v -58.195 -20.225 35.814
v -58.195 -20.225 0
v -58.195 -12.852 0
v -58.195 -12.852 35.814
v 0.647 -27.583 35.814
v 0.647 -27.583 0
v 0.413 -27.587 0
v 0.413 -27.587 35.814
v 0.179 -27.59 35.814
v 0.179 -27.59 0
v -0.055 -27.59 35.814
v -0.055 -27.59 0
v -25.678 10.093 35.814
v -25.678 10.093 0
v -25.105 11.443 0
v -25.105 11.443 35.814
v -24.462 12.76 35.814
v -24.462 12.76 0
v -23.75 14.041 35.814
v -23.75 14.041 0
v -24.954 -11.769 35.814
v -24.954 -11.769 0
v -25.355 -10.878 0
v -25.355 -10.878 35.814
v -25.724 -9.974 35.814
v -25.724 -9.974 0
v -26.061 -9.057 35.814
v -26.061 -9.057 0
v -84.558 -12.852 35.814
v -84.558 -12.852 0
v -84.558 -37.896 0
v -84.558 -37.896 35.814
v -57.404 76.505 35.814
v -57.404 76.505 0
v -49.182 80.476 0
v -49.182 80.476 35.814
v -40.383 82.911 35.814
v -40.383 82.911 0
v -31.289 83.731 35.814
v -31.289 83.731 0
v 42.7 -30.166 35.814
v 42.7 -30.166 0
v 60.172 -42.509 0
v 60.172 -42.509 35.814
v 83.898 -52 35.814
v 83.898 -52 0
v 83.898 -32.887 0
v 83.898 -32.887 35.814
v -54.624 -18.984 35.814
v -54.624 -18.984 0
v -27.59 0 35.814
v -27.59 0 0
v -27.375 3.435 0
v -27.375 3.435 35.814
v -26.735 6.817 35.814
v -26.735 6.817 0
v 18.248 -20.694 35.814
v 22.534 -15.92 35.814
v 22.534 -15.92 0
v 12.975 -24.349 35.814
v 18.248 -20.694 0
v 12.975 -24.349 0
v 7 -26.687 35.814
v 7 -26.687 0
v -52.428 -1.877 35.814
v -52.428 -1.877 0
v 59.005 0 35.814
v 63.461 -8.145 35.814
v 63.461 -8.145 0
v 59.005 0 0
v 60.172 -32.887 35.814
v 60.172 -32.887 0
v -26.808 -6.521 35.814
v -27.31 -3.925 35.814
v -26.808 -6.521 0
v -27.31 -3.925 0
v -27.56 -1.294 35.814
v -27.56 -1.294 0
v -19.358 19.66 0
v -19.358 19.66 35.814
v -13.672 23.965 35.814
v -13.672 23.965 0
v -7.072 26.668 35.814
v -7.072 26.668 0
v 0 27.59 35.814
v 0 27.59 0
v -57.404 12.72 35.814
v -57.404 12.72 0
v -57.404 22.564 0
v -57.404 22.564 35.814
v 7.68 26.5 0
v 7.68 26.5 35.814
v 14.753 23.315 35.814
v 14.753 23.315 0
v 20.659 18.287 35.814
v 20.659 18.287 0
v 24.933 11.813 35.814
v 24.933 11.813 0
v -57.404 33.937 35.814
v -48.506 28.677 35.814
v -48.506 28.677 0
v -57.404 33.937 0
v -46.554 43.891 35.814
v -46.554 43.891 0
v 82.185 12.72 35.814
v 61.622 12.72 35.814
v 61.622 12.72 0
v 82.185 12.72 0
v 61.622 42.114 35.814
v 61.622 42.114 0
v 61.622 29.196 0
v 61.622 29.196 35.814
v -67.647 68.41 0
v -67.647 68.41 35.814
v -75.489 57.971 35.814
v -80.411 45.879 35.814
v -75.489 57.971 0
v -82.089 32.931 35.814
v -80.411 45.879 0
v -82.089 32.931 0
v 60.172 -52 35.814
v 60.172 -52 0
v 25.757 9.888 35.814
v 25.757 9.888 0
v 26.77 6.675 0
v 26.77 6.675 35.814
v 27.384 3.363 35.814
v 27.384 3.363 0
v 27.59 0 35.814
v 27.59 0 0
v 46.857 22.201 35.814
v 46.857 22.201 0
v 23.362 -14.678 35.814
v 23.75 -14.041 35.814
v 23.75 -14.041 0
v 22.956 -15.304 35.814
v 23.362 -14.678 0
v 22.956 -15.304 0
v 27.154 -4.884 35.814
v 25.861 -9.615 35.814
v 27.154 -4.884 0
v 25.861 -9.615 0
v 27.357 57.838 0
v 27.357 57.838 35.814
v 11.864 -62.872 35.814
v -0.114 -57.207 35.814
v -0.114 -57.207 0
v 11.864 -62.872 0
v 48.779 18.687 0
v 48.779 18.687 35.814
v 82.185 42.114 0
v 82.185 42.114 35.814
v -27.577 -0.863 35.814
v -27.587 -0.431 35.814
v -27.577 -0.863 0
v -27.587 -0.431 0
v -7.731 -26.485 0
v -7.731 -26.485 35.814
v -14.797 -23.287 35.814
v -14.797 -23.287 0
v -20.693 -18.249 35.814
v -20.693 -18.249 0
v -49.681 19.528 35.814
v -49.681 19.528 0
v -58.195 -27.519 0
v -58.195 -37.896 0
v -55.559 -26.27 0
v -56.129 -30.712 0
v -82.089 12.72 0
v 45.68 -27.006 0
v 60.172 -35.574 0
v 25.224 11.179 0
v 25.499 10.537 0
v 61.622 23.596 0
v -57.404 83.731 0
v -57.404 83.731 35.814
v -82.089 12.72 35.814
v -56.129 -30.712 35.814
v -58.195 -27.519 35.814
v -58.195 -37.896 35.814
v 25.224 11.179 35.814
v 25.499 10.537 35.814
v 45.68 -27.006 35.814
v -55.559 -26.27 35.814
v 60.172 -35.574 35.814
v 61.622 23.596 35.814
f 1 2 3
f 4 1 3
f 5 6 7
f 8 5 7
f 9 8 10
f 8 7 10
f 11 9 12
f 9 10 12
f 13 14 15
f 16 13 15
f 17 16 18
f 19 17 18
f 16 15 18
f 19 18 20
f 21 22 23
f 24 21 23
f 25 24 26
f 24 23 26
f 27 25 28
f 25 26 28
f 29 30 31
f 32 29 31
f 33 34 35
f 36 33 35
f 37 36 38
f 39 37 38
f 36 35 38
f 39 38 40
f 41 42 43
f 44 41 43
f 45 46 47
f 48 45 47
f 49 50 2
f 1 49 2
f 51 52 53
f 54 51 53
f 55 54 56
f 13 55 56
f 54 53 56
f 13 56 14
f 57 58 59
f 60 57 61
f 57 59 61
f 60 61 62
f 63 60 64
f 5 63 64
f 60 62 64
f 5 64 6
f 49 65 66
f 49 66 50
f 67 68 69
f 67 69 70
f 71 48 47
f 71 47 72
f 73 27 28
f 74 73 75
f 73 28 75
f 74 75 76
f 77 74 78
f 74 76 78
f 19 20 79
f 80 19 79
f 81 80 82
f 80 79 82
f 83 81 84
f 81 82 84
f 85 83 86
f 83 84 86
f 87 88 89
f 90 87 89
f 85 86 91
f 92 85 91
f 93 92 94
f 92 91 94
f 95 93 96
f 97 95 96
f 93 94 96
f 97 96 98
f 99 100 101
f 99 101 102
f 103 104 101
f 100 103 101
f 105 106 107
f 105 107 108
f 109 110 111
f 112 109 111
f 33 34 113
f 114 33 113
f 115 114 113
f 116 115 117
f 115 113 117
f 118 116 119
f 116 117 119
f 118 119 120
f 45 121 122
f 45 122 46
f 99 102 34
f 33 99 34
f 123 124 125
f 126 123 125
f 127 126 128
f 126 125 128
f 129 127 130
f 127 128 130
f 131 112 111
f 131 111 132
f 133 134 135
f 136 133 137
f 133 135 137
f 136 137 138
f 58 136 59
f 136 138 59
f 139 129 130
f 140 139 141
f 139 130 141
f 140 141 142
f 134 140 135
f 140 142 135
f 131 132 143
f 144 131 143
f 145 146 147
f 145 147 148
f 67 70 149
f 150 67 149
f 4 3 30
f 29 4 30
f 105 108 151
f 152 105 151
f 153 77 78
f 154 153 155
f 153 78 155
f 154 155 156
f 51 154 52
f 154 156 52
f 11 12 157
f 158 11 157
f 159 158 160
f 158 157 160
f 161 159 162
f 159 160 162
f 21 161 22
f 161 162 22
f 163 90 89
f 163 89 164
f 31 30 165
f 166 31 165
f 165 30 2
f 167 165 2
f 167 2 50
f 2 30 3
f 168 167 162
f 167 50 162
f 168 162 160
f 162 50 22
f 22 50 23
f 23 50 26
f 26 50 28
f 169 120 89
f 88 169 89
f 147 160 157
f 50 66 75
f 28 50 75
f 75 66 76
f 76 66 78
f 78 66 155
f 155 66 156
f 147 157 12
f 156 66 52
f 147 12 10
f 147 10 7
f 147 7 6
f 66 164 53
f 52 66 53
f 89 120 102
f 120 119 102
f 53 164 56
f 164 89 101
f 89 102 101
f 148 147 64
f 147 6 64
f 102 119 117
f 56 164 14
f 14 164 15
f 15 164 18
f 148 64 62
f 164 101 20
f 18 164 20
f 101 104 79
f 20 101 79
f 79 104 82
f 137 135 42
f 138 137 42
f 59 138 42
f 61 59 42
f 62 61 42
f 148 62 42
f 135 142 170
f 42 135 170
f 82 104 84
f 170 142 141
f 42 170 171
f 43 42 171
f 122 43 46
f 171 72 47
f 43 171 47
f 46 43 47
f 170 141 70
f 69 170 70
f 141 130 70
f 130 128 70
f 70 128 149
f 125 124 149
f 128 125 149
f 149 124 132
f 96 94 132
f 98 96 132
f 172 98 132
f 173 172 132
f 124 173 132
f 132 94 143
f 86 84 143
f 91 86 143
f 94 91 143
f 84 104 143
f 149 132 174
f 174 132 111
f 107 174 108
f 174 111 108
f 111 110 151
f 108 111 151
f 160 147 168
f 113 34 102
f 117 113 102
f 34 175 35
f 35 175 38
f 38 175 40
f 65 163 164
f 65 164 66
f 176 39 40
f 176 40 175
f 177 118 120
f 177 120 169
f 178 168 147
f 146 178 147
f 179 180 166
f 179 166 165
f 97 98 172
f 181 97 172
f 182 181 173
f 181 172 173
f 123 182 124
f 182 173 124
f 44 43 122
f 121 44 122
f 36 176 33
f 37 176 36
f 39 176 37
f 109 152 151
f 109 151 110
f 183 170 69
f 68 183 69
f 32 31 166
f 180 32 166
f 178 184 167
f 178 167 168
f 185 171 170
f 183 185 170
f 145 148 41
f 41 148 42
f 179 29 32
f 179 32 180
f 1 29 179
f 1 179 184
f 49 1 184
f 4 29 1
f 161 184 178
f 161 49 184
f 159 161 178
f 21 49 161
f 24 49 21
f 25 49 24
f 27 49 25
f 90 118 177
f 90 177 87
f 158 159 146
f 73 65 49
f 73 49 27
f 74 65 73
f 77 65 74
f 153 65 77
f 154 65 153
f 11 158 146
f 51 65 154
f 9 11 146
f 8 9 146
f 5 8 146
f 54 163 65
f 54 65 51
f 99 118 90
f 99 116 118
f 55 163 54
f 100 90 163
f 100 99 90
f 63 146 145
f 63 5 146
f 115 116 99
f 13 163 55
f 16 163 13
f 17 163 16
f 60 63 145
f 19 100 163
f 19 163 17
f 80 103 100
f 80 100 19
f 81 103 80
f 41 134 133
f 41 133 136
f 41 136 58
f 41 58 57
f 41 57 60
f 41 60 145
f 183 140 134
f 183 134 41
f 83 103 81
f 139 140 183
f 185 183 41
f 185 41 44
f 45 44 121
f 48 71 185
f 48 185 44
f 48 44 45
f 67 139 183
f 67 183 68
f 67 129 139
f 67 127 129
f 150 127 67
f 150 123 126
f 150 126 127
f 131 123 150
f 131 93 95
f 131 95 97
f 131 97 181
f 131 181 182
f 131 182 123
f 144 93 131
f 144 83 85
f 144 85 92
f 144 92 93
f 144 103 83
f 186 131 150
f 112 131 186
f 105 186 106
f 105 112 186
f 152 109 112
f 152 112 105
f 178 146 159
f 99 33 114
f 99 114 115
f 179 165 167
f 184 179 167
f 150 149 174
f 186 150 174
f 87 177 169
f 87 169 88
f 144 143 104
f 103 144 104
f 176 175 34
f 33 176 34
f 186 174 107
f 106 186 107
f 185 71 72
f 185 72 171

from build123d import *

# Parameters (mm, degrees)
F1_DEPTH = 35.814


with BuildPart() as f1:
    # F0 (on Top) → F1 (new body)
    with BuildSketch(Plane.XY):
        with BuildLine():
            Line((51.7625180093, 0), (27.5901837137, 0))
            ThreePointArc((27.5901837137, 0), (26.6128492382, -7.2783578353), (23.7500865741, -14.0410692284))
            Line((23.7500865741, -14.0410692284), (45.6795035229, -27.0057571909))
            Line((45.6795035229, -27.0057571909), (63.4614136494, -8.1451914058))
            Line((63.4614136494, -8.1451914058), (59.0046110443, 0))
            Line((59.0046110443, 0), (51.7625180093, 0))
        make_face()
        with BuildLine():
            ThreePointArc((25.757346868, 9.8882414855), (27.1281050704, 5.0283349774), (27.5901837137, 0))
            Line((27.5901837137, 0), (51.7625180093, 0))
            Line((51.7625180093, 0), (59.0046110443, 0))
            Line((59.0046110443, 0), (48.7794158137, 18.6874267707))
            Line((48.7794158137, 18.6874267707), (25.757346868, 9.8882414855))
        make_face()
        with BuildLine():
            ThreePointArc((24.933207179, 11.8132729218), (25.3635467533, 10.8585787951), (25.757346868, 9.8882414855))
            Line((25.757346868, 9.8882414855), (48.7794158137, 18.6874267707))
            Line((48.7794158137, 18.6874267707), (46.8570488969, 22.2007182211))
            Line((46.8570488969, 22.2007182211), (24.933207179, 11.8132729218))
        make_face()
        with BuildLine():
            Line((45.6795035229, -27.0057571909), (23.7500865741, -14.0410692284))
            ThreePointArc((23.7500865741, -14.0410692284), (23.1611622563, -14.9926248634), (22.5341352105, -15.9195159371))
            Line((22.5341352105, -15.9195159371), (42.7000339634, -30.1659622101))
            Line((42.7000339634, -30.1659622101), (45.6795035229, -27.0057571909))
        make_face()
        with BuildLine():
            ThreePointArc((0, 27.5901837137), (14.7527602025, 23.3146800056), (24.933207179, 11.8132729218))
            Line((24.933207179, 11.8132729218), (46.8570488969, 22.2007182211))
            Line((46.8570488969, 22.2007182211), (27.3571926677, 57.8383884177))
            Line((27.3571926677, 57.8383884177), (-46.553738744, 43.8912813025))
            Line((-46.553738744, 43.8912813025), (-48.5064647709, 28.6770588287))
            Line((-48.5064647709, 28.6770588287), (-23.7500865741, 14.0410692284))
            ThreePointArc((-23.7500865741, 14.0410692284), (-13.6715499818, 23.9647023443), (0, 27.5901837137))
        make_face()
        Polygon((46.8570488969, 22.2007182211), (48.7794158137, 18.6874267707), (61.6222023964, 23.5960237775), (61.6222023964, 29.1964001954), align=None)
        with BuildLine():
            Line((42.7000339634, -30.1659622101), (22.5341352105, -15.9195159371))
            ThreePointArc((22.5341352105, -15.9195159371), (12.9748741266, -24.3489399924), (0.646933583, -27.5825980338))
            Line((0.646933583, -27.5825980338), (0.646933583, -51.7584751282))
            Line((0.646933583, -51.7584751282), (-0.1141139383, -57.2067654742))
            Line((-0.1141139383, -57.2067654742), (11.8641179418, -62.8723935514))
            Line((11.8641179418, -62.8723935514), (42.7000339634, -30.1659622101))
        make_face()
        Polygon((60.1722635329, -35.5738879206), (45.6795035229, -27.0057571909), (42.7000339634, -30.1659622101), (60.1722635329, -42.5094328821), align=None)
        Polygon((61.6222023964, 29.1964001954), (61.6222023964, 23.5960237775), (61.6222023964, 12.7198761329), (82.1849033237, 12.7198761329), (82.1849033237, 42.1139970422), (61.6222023964, 42.1139970422), align=None)
        with BuildLine():
            Line((0.646933583, -51.7584751282), (0.646933583, -27.5825980338))
            ThreePointArc((0.646933583, -27.5825980338), (0.2959728605, -27.5885961481), (-0.0550357677, -27.5901288221))
            Line((-0.0550357677, -27.5901288221), (-0.1141139383, -57.2067654742))
            Line((-0.1141139383, -57.2067654742), (0.646933583, -51.7584751282))
        make_face()
        Polygon((60.1722635329, -32.8871421516), (60.1722635329, -35.5738879206), (60.1722635329, -42.5094328821), (60.1722635329, -51.9999079406), (83.8984623551, -51.9999079406), (83.8984623551, -32.8871421516), align=None)
        with BuildLine():
            ThreePointArc((-25.6776657916, 10.0933501301), (-24.7925754512, 12.1056366976), (-23.7500865741, 14.0410692284))
            Line((-23.7500865741, 14.0410692284), (-48.5064647709, 28.6770588287))
            Line((-48.5064647709, 28.6770588287), (-49.6806796231, 19.5284298117))
            Line((-49.6806796231, 19.5284298117), (-25.6776657916, 10.0933501301))
        make_face()
        with BuildLine():
            Line((-0.1141139383, -57.2067654742), (-0.0550357677, -27.5901288221))
            ThreePointArc((-0.0550357677, -27.5901288221), (-14.7966318916, -23.2868615751), (-24.9540884816, -11.7690996006))
            Line((-24.9540884816, -11.7690996006), (-55.558786258, -26.2695064246))
            Line((-55.558786258, -26.2695064246), (-56.1289855148, -30.712084763))
            Line((-56.1289855148, -30.712084763), (-0.1141139383, -57.2067654742))
        make_face()
        with BuildLine():
            ThreePointArc((-27.5901837137, 0), (-27.1078379245, 5.1364735386), (-25.6776657916, 10.0933501301))
            Line((-25.6776657916, 10.0933501301), (-49.6806796231, 19.5284298117))
            Line((-49.6806796231, 19.5284298117), (-52.4280109182, -1.8767796021))
            Line((-52.4280109182, -1.8767796021), (-51.7625180093, 0))
            Line((-51.7625180093, 0), (-27.5901837137, 0))
        make_face()
        Polygon((-49.6806796231, 19.5284298117), (-48.5064647709, 28.6770588287), (-57.4042089283, 33.9374119352), (-57.4042089283, 22.5643866682), align=None)
        with BuildLine():
            Line((-55.558786258, -26.2695064246), (-24.9540884816, -11.7690996006))
            ThreePointArc((-24.9540884816, -11.7690996006), (-25.5436141585, -10.4279438566), (-26.0611201377, -9.0573867382))
            Line((-26.0611201377, -9.0573867382), (-54.6237197743, -18.9841477443))
            Line((-54.6237197743, -18.9841477443), (-55.558786258, -26.2695064246))
        make_face()
        with BuildLine():
            ThreePointArc((-27.5598451654, -1.2935114286), (-27.5825980338, -0.646933583), (-27.5901837137, 0))
            Line((-27.5901837137, 0), (-51.7625180093, 0))
            Line((-51.7625180093, 0), (-52.4280109182, -1.8767796021))
            Line((-52.4280109182, -1.8767796021), (-27.5598451654, -1.2935114286))
        make_face()
        with BuildLine():
            Line((-57.4042089283, 22.5643866682), (-57.4042089283, 33.9374119352))
            Line((-57.4042089283, 33.9374119352), (-57.4042089283, 76.5046922763))
            ThreePointArc((-57.4042089283, 76.5046922763), (-75.4889931725, 57.9712056034), (-82.0888903124, 32.9314191196))
            Line((-82.0888903124, 32.9314191196), (-82.0888903124, 12.7198761329))
            Line((-82.0888903124, 12.7198761329), (-57.4042089283, 12.7198761329))
            Line((-57.4042089283, 12.7198761329), (-57.4042089283, 22.5643866682))
        make_face()
        with BuildLine():
            ThreePointArc((-26.0611201377, -9.0573867382), (-27.0900612765, -5.2294184564), (-27.5598451654, -1.2935114286))
            Line((-27.5598451654, -1.2935114286), (-52.4280109182, -1.8767796021))
            Line((-52.4280109182, -1.8767796021), (-54.6237197743, -18.9841477443))
            Line((-54.6237197743, -18.9841477443), (-26.0611201377, -9.0573867382))
        make_face()
        Polygon((-58.1950843334, -27.5185759263), (-55.558786258, -26.2695064246), (-54.6237197743, -18.9841477443), (-58.1950843334, -20.2253541784), align=None)
        Polygon((-58.1950843334, -37.8960072994), (-58.1950843334, -27.5185759263), (-58.1950843334, -20.2253541784), (-58.1950843334, -12.8516880795), (-84.5575258136, -12.8516880795), (-84.5575258136, -37.8960072994), align=None)
    extrude(amount=F1_DEPTH)


with BuildPart() as f1b:
    # F0 (on Top) → F1, piece 2 (new body)
    with BuildSketch(Plane.XY):
        with BuildLine():
            Line((-57.4042089283, 83.7314191196), (-57.4042089283, 76.5046922763))
            ThreePointArc((-57.4042089283, 76.5046922763), (-44.8372799518, 81.8914144033), (-31.2888903124, 83.7314191196))
            Line((-31.2888903124, 83.7314191196), (-57.4042089283, 83.7314191196))
        make_face()
    extrude(amount=F1_DEPTH)


solid = Compound([f1.part, f1b.part])
